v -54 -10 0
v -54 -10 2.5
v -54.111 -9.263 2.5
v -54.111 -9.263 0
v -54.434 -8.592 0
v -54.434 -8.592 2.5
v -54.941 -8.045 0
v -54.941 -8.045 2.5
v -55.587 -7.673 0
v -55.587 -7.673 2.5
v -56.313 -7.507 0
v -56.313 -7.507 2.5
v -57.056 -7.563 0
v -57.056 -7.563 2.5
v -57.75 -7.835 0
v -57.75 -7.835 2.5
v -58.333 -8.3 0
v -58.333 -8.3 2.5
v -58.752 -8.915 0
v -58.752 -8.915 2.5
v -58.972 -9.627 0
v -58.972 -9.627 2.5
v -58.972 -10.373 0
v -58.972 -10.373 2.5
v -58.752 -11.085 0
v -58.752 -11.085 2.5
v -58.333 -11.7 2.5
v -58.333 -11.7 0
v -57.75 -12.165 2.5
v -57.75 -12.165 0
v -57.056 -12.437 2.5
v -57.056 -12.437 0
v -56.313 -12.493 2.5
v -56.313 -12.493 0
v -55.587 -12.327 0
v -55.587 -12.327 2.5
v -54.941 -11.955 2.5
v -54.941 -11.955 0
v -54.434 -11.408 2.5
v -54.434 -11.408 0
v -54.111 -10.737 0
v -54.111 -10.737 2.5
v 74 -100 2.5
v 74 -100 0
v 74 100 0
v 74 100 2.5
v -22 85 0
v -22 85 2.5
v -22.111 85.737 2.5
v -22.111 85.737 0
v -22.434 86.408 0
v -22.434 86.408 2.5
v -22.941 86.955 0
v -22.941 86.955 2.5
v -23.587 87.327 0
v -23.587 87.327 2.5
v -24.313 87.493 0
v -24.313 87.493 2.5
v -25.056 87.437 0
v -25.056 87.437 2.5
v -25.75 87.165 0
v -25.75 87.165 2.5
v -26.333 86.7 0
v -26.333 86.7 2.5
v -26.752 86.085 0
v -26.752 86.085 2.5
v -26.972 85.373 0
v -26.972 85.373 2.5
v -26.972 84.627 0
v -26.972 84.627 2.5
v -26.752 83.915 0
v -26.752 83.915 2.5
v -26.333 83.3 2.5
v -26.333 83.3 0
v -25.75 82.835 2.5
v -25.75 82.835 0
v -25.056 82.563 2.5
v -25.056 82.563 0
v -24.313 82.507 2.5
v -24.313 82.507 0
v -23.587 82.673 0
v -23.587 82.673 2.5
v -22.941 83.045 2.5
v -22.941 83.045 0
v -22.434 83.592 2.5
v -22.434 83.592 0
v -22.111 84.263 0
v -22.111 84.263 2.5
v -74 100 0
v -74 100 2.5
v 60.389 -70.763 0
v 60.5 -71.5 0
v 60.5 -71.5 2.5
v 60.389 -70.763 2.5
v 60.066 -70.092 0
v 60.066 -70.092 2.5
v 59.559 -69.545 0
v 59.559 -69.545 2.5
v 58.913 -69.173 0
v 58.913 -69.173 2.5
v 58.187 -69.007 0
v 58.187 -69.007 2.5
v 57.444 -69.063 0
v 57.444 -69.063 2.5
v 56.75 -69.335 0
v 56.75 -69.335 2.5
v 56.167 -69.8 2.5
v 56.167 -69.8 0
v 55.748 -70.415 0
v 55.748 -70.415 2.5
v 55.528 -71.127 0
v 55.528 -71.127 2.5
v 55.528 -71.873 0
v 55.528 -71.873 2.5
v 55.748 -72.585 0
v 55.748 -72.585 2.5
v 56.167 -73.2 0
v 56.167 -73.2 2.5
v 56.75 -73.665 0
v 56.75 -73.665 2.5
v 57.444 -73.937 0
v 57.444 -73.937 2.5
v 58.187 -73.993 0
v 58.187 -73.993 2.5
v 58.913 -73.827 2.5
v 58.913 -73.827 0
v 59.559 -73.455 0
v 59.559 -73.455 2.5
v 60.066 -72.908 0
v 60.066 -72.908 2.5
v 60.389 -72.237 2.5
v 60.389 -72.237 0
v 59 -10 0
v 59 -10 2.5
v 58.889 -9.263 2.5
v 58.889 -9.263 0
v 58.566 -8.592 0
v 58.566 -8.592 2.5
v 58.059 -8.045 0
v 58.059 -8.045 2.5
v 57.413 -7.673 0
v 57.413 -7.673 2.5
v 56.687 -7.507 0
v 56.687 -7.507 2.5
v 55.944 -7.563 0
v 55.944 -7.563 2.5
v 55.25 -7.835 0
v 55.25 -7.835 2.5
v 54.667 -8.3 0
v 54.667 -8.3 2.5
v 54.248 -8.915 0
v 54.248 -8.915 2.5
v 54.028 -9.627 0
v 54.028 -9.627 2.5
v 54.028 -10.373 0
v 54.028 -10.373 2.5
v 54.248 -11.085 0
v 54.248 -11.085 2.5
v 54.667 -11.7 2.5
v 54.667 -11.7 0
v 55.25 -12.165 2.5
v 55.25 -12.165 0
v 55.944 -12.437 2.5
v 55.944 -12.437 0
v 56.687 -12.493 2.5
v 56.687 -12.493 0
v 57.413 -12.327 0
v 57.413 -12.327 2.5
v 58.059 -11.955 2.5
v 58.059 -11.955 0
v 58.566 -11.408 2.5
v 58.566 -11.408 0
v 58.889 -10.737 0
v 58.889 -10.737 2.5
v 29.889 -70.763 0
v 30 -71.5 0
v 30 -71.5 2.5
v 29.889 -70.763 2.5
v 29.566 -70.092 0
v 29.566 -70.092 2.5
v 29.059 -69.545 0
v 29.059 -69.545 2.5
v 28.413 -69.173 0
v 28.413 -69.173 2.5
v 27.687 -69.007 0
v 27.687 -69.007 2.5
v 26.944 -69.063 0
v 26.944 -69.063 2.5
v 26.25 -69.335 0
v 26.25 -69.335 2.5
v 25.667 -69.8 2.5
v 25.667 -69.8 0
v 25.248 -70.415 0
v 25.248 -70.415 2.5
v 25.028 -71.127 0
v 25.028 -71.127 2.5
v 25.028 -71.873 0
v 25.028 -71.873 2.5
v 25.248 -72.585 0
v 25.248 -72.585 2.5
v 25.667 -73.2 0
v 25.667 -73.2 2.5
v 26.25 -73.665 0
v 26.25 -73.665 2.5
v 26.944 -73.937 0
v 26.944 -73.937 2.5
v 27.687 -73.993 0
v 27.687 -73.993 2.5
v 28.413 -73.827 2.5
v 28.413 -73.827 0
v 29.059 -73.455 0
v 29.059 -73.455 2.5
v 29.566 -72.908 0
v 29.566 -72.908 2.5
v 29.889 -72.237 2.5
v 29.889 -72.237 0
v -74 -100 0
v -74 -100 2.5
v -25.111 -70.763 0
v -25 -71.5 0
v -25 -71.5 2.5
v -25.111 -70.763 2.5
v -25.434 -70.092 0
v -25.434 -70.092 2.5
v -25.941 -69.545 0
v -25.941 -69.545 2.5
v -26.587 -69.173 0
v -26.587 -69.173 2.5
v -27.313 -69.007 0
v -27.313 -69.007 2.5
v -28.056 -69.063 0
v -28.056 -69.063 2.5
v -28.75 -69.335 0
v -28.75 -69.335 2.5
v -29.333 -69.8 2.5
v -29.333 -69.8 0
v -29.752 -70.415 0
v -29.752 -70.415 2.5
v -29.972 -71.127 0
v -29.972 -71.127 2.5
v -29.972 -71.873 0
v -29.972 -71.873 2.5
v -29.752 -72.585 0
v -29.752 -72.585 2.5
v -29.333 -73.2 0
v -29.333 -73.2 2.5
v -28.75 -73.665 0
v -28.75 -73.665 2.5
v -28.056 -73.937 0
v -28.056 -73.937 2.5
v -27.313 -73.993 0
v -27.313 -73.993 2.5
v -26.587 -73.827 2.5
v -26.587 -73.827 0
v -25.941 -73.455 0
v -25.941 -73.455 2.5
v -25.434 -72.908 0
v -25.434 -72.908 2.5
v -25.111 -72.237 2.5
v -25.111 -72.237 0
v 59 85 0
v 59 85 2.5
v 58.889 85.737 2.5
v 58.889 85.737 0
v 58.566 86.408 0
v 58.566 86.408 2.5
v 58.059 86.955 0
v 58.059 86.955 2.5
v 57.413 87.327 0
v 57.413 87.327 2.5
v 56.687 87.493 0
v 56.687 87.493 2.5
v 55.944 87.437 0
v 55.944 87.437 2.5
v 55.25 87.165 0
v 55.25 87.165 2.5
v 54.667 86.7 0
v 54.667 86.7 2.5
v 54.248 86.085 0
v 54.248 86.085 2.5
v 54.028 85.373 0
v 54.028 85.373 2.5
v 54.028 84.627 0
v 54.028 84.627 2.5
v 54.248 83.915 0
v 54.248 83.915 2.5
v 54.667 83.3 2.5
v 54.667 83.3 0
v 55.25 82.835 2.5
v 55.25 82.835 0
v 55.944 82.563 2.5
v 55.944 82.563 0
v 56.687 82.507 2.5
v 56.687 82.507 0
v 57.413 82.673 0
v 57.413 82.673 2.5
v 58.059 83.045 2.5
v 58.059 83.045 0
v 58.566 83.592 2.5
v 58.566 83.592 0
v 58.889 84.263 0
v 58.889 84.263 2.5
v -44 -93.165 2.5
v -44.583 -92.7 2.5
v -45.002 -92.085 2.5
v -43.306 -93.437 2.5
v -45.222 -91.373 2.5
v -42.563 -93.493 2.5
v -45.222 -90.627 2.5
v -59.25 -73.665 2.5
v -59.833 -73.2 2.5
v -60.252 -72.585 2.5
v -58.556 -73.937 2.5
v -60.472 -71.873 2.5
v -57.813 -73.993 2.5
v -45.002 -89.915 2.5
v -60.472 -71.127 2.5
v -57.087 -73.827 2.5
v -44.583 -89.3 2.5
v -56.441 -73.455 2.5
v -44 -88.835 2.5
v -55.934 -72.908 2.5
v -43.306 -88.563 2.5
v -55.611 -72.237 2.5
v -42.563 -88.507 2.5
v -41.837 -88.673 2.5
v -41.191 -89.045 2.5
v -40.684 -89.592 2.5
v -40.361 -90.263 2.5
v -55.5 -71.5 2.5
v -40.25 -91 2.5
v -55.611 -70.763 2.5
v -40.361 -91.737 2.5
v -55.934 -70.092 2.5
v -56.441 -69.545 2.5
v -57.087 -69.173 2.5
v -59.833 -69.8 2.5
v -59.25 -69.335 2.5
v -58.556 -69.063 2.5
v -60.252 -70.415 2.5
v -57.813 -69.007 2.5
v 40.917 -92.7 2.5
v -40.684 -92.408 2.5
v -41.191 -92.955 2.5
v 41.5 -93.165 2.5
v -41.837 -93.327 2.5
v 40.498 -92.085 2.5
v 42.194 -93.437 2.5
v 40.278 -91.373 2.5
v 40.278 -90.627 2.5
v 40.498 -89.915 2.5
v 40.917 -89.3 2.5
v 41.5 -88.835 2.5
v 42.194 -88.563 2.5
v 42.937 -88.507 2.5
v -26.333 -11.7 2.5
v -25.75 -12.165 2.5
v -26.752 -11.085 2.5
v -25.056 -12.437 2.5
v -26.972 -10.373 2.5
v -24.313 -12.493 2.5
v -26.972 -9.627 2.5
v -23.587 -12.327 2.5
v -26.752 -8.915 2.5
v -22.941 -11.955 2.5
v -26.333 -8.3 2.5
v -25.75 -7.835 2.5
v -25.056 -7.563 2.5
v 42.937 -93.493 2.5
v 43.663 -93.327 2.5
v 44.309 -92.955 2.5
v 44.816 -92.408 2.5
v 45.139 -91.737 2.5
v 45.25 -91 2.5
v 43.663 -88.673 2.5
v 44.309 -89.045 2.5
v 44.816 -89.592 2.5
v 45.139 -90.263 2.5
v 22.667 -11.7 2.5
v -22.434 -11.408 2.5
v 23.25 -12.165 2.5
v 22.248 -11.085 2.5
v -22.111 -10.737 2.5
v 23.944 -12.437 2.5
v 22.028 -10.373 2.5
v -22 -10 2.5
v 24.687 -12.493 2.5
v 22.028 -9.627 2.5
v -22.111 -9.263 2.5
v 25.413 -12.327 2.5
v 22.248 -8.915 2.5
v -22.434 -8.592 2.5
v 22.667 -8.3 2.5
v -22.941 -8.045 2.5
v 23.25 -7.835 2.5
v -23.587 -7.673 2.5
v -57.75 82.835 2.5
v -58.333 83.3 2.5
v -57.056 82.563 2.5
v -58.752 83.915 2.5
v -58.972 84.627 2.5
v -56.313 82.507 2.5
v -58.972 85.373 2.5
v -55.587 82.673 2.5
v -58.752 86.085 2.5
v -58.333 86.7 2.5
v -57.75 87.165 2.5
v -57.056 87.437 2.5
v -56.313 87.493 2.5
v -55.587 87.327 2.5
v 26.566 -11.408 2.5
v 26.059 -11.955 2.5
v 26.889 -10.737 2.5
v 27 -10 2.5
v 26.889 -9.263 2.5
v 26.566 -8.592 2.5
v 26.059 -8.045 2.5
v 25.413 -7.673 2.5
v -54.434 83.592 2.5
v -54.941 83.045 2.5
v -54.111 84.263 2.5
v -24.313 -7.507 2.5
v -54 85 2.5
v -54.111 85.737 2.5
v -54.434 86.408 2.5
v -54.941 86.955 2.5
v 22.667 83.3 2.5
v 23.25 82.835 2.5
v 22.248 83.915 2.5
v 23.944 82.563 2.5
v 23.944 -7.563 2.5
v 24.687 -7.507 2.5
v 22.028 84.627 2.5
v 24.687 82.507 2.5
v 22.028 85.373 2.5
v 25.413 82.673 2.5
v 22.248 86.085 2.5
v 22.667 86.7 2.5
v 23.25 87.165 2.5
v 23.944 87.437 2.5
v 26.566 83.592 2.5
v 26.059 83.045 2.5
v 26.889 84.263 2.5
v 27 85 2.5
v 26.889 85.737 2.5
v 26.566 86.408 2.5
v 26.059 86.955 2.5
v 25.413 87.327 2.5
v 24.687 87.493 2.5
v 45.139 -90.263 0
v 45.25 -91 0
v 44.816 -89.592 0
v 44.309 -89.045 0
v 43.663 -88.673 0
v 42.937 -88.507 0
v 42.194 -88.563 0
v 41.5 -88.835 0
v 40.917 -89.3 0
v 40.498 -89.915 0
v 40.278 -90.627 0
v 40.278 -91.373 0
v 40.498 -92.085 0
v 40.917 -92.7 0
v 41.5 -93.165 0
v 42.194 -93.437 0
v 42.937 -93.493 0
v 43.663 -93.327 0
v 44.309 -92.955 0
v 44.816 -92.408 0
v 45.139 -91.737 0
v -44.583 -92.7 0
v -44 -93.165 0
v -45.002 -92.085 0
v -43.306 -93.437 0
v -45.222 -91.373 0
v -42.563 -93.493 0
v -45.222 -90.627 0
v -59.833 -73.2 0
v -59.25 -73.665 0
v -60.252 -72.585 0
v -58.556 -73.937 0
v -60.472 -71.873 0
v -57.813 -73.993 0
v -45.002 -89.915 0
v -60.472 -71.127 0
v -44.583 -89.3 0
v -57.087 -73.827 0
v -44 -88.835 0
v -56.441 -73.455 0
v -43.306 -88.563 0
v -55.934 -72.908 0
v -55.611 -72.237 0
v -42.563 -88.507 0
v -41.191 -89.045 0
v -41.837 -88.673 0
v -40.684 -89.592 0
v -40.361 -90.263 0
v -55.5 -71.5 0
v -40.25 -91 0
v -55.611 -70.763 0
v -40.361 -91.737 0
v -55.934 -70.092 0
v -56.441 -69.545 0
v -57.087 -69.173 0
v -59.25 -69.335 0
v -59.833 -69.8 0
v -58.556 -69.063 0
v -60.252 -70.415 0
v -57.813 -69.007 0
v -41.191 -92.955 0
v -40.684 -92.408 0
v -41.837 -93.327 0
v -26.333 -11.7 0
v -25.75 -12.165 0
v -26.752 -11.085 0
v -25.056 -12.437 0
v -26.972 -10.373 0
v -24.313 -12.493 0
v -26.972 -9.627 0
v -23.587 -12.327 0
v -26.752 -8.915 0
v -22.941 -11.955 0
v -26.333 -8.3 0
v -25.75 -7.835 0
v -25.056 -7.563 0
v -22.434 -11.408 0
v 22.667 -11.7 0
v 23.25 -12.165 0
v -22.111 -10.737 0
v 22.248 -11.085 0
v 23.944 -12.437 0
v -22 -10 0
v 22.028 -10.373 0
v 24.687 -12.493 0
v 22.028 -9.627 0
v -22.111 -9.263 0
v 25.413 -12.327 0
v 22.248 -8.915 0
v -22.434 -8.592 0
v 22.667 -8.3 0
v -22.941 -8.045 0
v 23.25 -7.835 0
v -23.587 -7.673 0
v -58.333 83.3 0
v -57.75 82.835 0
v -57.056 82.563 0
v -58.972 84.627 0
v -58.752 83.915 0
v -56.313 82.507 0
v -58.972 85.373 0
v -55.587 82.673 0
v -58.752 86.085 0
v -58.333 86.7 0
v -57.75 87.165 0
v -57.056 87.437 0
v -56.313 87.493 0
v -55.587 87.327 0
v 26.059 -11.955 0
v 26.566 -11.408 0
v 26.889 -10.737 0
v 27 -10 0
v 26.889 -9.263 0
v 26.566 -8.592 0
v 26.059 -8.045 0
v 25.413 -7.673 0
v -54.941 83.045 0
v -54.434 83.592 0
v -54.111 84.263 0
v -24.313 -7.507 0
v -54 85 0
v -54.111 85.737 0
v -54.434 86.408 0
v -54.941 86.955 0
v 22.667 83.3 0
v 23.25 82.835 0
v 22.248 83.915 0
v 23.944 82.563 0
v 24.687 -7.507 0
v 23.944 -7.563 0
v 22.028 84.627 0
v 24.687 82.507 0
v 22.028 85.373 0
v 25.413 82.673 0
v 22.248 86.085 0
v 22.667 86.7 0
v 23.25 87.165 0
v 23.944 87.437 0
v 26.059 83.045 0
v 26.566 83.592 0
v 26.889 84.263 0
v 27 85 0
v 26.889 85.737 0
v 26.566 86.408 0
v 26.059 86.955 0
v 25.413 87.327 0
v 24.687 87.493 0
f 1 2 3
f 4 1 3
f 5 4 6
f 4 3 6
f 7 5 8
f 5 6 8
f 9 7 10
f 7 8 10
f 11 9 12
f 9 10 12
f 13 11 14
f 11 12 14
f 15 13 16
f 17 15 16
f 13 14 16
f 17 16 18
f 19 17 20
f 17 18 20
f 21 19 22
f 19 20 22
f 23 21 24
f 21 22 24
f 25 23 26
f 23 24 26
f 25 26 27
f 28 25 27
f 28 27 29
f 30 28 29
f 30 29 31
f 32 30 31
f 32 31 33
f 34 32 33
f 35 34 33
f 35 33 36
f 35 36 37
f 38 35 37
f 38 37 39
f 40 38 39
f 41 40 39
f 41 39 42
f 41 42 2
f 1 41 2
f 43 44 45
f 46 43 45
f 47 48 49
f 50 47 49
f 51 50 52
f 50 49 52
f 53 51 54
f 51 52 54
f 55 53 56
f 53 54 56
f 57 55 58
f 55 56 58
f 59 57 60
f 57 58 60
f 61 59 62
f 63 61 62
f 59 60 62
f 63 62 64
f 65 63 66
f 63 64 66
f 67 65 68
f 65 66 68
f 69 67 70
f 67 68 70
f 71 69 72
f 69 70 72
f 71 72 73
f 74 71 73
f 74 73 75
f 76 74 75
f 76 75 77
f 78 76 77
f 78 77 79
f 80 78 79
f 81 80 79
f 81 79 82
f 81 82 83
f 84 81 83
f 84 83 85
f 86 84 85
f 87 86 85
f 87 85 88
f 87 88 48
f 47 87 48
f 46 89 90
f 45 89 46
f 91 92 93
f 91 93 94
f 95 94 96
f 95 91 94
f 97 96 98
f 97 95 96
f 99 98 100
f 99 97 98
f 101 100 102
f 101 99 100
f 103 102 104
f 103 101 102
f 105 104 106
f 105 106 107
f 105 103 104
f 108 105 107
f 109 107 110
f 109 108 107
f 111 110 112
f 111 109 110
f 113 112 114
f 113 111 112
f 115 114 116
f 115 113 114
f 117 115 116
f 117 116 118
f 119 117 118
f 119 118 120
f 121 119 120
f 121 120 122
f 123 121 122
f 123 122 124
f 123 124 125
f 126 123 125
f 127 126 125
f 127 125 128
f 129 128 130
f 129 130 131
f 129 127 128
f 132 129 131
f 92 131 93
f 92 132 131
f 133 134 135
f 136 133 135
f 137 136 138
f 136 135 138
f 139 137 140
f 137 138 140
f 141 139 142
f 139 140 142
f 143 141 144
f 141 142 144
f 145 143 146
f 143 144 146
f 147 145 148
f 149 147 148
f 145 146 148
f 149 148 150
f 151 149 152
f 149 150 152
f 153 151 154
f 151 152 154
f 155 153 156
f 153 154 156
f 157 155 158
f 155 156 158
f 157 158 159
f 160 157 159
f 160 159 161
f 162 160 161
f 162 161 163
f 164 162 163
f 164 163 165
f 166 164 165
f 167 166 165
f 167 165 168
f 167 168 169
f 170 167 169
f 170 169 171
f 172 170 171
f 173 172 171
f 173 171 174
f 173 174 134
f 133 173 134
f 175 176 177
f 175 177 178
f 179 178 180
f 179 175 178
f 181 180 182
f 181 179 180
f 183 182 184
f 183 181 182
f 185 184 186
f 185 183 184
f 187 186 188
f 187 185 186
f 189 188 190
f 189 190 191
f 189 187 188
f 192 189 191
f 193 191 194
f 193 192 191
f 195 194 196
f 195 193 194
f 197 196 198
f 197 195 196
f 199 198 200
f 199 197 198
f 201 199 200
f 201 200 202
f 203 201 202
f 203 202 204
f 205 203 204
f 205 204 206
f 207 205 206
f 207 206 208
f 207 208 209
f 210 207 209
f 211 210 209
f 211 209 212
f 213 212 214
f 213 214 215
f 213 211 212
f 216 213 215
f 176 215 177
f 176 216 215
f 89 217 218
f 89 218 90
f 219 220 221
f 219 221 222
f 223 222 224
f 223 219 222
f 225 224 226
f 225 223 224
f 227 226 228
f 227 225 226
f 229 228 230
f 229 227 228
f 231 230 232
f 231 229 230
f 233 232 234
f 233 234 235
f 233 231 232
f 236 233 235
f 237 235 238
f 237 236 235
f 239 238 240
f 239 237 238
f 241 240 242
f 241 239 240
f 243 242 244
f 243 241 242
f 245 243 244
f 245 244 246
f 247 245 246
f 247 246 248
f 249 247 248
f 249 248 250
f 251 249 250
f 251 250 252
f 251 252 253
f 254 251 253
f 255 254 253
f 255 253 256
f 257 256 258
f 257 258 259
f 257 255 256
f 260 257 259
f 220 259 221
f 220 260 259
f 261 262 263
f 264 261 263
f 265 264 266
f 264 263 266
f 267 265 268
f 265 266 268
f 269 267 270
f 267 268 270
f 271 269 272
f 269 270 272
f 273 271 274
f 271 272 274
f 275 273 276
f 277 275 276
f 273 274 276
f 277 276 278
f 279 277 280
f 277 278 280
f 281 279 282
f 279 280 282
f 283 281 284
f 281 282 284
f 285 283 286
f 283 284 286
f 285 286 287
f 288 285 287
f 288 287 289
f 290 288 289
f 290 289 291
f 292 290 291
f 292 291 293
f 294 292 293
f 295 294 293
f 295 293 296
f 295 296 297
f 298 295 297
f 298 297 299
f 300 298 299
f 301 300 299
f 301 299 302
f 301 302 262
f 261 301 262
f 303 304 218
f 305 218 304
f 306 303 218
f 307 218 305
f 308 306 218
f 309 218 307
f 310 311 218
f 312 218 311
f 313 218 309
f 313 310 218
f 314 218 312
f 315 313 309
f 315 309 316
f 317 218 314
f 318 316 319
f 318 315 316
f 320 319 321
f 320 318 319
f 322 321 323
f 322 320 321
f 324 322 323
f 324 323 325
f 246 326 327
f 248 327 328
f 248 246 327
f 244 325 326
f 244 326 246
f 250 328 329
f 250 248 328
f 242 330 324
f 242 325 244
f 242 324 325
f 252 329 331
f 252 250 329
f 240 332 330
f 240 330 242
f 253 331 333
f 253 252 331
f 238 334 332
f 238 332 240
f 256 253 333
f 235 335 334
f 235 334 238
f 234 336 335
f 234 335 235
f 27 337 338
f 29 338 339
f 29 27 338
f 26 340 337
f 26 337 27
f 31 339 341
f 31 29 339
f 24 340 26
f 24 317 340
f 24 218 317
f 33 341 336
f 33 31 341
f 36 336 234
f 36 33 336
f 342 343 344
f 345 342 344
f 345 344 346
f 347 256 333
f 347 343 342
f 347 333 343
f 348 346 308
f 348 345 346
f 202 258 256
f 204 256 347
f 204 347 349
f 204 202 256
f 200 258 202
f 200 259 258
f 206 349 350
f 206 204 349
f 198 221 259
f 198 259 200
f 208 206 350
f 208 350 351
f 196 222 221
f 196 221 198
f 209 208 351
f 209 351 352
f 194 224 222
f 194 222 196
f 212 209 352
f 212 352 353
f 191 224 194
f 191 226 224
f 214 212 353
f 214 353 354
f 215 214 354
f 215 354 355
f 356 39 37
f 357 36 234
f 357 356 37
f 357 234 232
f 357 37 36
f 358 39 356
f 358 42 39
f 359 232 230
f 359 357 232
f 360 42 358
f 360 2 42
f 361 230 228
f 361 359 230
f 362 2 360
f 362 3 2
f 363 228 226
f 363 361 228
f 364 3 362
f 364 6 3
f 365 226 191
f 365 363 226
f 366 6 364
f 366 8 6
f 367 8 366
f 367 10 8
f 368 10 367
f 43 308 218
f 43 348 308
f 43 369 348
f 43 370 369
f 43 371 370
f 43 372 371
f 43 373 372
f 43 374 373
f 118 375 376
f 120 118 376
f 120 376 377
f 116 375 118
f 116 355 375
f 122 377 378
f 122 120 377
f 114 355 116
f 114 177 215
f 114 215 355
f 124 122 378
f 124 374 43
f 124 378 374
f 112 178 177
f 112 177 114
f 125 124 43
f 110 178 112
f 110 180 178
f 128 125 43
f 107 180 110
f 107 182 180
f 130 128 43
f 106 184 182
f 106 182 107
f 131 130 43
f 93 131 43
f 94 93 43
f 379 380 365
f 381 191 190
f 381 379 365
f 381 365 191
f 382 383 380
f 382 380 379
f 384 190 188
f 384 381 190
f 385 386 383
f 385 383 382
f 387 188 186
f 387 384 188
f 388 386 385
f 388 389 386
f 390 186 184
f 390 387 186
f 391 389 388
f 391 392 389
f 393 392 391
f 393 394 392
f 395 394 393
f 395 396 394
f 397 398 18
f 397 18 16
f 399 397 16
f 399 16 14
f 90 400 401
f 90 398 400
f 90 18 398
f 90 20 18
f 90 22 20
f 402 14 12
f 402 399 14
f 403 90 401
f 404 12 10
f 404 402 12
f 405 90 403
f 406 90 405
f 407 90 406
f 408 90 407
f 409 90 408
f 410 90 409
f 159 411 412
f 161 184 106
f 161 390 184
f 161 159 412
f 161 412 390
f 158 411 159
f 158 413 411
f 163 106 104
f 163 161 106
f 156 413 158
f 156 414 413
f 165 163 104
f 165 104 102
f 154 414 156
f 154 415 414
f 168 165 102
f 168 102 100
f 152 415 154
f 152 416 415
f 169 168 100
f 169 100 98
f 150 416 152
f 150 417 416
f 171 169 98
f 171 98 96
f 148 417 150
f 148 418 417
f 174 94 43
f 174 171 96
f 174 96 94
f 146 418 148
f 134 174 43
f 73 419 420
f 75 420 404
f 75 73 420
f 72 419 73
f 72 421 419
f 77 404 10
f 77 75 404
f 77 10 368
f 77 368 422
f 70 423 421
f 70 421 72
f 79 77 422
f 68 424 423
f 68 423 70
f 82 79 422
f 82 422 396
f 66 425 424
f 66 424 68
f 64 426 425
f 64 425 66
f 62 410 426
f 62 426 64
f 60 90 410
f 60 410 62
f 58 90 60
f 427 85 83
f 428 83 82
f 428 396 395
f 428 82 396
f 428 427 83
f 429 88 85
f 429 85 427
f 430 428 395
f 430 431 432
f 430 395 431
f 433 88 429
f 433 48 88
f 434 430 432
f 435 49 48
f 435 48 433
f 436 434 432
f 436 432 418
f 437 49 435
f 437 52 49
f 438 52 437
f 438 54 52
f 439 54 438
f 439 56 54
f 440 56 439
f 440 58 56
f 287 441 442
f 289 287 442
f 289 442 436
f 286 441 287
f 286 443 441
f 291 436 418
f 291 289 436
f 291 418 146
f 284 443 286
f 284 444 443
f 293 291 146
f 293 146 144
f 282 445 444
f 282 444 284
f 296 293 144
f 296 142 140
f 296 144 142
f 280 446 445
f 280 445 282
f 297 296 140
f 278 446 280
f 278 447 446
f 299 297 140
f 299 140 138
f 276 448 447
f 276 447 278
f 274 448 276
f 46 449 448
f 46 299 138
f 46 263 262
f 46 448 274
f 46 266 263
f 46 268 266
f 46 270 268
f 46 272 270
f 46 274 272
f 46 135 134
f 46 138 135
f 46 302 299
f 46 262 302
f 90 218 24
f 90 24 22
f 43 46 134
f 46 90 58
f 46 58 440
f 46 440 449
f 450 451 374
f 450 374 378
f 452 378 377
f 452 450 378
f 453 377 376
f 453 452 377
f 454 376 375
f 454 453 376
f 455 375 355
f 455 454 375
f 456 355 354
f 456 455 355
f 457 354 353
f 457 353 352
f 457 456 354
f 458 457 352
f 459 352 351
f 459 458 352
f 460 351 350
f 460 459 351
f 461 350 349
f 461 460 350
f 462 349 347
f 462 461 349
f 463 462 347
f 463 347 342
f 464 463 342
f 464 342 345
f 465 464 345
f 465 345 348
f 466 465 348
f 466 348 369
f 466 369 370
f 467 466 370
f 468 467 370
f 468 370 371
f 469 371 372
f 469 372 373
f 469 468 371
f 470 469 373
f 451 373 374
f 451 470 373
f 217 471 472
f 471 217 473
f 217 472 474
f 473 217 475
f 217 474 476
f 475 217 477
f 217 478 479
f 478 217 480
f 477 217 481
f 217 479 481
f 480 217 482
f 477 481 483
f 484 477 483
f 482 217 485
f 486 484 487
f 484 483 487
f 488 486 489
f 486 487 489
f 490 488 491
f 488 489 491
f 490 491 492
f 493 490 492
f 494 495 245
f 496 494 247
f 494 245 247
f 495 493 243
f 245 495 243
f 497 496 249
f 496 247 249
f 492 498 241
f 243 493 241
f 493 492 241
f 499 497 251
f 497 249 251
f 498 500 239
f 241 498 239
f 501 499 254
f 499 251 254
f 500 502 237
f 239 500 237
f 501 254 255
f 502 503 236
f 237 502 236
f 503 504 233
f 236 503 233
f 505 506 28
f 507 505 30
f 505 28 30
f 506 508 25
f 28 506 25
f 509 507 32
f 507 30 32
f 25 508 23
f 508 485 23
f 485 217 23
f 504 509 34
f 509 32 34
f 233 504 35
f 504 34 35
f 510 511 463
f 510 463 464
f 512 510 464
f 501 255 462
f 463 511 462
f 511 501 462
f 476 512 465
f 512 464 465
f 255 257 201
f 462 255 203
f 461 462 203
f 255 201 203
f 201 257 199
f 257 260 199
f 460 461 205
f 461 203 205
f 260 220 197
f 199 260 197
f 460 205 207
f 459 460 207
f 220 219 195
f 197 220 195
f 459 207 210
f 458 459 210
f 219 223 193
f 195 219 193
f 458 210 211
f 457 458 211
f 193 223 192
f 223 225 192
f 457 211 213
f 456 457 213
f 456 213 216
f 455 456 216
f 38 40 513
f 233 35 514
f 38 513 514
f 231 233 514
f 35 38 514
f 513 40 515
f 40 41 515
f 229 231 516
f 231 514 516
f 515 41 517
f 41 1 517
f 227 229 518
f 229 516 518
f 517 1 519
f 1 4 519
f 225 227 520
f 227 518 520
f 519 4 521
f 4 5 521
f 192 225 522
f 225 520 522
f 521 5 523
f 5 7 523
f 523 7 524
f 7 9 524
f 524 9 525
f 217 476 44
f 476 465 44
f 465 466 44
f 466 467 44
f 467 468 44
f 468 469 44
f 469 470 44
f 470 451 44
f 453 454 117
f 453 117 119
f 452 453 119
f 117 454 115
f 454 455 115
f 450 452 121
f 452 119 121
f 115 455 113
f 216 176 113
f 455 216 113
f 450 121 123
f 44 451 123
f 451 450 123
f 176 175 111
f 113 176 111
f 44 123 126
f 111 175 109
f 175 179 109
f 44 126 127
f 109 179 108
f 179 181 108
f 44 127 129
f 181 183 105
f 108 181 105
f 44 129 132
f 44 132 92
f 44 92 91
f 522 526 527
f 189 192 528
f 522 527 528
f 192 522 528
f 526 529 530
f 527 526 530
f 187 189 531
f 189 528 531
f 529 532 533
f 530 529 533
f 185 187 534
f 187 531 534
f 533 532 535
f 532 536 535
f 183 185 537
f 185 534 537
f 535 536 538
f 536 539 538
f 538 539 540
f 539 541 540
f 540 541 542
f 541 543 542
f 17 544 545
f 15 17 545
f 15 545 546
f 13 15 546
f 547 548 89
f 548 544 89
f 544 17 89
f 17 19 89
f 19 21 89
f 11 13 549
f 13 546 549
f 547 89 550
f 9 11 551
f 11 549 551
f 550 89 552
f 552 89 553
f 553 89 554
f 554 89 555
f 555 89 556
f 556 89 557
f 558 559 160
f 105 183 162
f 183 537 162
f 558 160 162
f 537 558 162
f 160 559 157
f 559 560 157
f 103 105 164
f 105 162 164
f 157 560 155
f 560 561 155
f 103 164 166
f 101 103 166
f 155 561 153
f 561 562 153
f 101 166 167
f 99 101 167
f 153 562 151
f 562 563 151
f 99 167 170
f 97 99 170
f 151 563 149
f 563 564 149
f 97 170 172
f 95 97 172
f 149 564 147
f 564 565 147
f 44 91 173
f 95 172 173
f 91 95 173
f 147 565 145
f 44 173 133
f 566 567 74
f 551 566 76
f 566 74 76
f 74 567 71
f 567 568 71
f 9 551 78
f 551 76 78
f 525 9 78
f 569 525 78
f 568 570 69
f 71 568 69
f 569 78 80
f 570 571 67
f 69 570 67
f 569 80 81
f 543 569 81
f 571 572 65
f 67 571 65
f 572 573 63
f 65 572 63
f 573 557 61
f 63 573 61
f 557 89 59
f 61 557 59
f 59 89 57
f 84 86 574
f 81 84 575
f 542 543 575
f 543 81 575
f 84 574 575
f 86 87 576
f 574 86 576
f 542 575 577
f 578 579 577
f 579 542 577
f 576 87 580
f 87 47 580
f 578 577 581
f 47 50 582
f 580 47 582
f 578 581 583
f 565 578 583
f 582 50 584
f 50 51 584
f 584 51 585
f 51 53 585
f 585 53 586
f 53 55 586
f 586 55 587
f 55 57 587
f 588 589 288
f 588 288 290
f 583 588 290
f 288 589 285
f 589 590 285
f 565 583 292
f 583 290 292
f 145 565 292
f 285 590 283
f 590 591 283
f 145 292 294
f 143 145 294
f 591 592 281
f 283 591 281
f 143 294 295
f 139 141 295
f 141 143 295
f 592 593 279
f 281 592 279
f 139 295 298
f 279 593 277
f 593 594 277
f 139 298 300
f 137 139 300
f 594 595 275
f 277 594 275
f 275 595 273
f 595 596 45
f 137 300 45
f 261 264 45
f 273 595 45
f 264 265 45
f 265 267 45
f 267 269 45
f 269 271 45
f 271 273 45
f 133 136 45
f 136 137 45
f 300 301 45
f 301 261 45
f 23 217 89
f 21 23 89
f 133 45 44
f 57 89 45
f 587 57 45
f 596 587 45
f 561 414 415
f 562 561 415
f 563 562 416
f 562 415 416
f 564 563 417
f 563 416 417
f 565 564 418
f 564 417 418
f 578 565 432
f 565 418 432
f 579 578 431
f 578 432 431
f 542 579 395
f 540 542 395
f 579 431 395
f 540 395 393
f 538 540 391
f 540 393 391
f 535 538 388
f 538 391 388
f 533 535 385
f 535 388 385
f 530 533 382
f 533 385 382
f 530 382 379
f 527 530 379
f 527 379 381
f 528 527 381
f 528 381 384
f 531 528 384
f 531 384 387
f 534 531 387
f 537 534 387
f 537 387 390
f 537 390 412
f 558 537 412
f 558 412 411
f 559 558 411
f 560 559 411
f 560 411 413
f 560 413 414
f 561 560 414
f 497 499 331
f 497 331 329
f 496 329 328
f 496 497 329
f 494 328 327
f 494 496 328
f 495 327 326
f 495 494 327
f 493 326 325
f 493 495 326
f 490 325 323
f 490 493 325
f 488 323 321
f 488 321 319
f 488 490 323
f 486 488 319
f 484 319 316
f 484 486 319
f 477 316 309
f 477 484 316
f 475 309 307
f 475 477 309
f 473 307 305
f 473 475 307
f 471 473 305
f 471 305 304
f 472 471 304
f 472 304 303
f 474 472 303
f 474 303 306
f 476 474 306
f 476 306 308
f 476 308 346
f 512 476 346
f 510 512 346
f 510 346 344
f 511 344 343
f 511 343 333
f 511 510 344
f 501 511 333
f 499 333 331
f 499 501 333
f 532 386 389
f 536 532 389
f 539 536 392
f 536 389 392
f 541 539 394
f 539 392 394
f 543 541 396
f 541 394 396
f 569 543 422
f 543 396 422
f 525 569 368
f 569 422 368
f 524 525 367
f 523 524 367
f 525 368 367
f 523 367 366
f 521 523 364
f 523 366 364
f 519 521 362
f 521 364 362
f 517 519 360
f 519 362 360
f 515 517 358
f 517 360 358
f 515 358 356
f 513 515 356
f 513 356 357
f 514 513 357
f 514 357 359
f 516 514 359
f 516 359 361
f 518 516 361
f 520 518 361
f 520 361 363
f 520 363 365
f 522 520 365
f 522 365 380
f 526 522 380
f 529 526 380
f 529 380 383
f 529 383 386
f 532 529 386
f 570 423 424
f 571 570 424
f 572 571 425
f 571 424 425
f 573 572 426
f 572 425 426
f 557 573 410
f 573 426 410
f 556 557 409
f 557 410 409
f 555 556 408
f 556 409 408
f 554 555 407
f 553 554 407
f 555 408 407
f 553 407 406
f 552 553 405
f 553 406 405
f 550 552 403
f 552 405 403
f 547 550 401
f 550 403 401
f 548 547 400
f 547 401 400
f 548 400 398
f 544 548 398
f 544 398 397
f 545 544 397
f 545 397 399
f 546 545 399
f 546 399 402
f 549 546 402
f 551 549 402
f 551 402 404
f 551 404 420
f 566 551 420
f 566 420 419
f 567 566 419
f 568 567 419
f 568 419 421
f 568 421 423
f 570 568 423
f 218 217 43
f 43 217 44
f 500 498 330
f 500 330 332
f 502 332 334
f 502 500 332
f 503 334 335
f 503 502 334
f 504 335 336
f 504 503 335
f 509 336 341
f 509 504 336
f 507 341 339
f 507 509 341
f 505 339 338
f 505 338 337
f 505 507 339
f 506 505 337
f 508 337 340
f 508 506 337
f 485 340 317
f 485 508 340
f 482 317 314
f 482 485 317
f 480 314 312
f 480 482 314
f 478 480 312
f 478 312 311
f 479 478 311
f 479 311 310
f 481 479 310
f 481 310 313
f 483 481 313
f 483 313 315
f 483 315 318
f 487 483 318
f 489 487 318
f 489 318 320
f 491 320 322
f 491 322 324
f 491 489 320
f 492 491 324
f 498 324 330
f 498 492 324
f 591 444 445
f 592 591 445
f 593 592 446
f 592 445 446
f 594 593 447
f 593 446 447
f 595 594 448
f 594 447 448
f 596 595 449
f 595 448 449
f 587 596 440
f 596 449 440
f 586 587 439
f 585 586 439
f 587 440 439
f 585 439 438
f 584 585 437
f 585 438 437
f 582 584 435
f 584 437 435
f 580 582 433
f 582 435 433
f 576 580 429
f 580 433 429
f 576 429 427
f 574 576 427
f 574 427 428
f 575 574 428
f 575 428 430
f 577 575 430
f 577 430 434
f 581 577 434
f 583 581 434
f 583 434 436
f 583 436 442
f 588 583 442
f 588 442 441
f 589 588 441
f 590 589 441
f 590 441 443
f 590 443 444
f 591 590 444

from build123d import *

# Parameters (mm, degrees)
SKETCH_1_W          = 148
SKETCH_1_H          = 200
SKETCH_1_R          = 2.5
EXTRUDE_1_DEPTH     = 2.5
SKETCH_2_R          = 2.5
CUT_EXTRUDE_1_DEPTH = 3


with BuildPart() as part:
    # 草图1 → 凸台-拉伸1 (new body)
    with BuildSketch(Plane.XY):
        Rectangle(SKETCH_1_W, SKETCH_1_H)
        with Locations((-58, -71.5)):
            Circle(SKETCH_1_R, mode=Mode.SUBTRACT)
        with Locations((-27.5, -71.5)):
            Circle(SKETCH_1_R, mode=Mode.SUBTRACT)
        with Locations((-42.75, -91)):
            Circle(SKETCH_1_R, mode=Mode.SUBTRACT)
        with Locations((42.75, -91)):
            Circle(SKETCH_1_R, mode=Mode.SUBTRACT)
        with Locations((58, -71.5)):
            Circle(SKETCH_1_R, mode=Mode.SUBTRACT)
        with Locations((27.5, -71.5)):
            Circle(SKETCH_1_R, mode=Mode.SUBTRACT)
    extrude(amount=EXTRUDE_1_DEPTH)

    # 草图2 → 切除-拉伸1 (cut)
    with BuildSketch(Plane.XY.offset(2.5)):
        with Locations((-56.5, -10)):
            Circle(SKETCH_2_R)
        with Locations((-24.5, -10)):
            Circle(SKETCH_2_R)
        with Locations((-56.5, 85)):
            Circle(SKETCH_2_R)
        with Locations((-24.5, 85)):
            Circle(SKETCH_2_R)
        with Locations((24.5, 85)):
            Circle(SKETCH_2_R)
        with Locations((56.5, 85)):
            Circle(SKETCH_2_R)
        with Locations((24.5, -10)):
            Circle(SKETCH_2_R)
        with Locations((56.5, -10)):
            Circle(SKETCH_2_R)
    extrude(amount=-CUT_EXTRUDE_1_DEPTH, mode=Mode.SUBTRACT)


solid = part.part
